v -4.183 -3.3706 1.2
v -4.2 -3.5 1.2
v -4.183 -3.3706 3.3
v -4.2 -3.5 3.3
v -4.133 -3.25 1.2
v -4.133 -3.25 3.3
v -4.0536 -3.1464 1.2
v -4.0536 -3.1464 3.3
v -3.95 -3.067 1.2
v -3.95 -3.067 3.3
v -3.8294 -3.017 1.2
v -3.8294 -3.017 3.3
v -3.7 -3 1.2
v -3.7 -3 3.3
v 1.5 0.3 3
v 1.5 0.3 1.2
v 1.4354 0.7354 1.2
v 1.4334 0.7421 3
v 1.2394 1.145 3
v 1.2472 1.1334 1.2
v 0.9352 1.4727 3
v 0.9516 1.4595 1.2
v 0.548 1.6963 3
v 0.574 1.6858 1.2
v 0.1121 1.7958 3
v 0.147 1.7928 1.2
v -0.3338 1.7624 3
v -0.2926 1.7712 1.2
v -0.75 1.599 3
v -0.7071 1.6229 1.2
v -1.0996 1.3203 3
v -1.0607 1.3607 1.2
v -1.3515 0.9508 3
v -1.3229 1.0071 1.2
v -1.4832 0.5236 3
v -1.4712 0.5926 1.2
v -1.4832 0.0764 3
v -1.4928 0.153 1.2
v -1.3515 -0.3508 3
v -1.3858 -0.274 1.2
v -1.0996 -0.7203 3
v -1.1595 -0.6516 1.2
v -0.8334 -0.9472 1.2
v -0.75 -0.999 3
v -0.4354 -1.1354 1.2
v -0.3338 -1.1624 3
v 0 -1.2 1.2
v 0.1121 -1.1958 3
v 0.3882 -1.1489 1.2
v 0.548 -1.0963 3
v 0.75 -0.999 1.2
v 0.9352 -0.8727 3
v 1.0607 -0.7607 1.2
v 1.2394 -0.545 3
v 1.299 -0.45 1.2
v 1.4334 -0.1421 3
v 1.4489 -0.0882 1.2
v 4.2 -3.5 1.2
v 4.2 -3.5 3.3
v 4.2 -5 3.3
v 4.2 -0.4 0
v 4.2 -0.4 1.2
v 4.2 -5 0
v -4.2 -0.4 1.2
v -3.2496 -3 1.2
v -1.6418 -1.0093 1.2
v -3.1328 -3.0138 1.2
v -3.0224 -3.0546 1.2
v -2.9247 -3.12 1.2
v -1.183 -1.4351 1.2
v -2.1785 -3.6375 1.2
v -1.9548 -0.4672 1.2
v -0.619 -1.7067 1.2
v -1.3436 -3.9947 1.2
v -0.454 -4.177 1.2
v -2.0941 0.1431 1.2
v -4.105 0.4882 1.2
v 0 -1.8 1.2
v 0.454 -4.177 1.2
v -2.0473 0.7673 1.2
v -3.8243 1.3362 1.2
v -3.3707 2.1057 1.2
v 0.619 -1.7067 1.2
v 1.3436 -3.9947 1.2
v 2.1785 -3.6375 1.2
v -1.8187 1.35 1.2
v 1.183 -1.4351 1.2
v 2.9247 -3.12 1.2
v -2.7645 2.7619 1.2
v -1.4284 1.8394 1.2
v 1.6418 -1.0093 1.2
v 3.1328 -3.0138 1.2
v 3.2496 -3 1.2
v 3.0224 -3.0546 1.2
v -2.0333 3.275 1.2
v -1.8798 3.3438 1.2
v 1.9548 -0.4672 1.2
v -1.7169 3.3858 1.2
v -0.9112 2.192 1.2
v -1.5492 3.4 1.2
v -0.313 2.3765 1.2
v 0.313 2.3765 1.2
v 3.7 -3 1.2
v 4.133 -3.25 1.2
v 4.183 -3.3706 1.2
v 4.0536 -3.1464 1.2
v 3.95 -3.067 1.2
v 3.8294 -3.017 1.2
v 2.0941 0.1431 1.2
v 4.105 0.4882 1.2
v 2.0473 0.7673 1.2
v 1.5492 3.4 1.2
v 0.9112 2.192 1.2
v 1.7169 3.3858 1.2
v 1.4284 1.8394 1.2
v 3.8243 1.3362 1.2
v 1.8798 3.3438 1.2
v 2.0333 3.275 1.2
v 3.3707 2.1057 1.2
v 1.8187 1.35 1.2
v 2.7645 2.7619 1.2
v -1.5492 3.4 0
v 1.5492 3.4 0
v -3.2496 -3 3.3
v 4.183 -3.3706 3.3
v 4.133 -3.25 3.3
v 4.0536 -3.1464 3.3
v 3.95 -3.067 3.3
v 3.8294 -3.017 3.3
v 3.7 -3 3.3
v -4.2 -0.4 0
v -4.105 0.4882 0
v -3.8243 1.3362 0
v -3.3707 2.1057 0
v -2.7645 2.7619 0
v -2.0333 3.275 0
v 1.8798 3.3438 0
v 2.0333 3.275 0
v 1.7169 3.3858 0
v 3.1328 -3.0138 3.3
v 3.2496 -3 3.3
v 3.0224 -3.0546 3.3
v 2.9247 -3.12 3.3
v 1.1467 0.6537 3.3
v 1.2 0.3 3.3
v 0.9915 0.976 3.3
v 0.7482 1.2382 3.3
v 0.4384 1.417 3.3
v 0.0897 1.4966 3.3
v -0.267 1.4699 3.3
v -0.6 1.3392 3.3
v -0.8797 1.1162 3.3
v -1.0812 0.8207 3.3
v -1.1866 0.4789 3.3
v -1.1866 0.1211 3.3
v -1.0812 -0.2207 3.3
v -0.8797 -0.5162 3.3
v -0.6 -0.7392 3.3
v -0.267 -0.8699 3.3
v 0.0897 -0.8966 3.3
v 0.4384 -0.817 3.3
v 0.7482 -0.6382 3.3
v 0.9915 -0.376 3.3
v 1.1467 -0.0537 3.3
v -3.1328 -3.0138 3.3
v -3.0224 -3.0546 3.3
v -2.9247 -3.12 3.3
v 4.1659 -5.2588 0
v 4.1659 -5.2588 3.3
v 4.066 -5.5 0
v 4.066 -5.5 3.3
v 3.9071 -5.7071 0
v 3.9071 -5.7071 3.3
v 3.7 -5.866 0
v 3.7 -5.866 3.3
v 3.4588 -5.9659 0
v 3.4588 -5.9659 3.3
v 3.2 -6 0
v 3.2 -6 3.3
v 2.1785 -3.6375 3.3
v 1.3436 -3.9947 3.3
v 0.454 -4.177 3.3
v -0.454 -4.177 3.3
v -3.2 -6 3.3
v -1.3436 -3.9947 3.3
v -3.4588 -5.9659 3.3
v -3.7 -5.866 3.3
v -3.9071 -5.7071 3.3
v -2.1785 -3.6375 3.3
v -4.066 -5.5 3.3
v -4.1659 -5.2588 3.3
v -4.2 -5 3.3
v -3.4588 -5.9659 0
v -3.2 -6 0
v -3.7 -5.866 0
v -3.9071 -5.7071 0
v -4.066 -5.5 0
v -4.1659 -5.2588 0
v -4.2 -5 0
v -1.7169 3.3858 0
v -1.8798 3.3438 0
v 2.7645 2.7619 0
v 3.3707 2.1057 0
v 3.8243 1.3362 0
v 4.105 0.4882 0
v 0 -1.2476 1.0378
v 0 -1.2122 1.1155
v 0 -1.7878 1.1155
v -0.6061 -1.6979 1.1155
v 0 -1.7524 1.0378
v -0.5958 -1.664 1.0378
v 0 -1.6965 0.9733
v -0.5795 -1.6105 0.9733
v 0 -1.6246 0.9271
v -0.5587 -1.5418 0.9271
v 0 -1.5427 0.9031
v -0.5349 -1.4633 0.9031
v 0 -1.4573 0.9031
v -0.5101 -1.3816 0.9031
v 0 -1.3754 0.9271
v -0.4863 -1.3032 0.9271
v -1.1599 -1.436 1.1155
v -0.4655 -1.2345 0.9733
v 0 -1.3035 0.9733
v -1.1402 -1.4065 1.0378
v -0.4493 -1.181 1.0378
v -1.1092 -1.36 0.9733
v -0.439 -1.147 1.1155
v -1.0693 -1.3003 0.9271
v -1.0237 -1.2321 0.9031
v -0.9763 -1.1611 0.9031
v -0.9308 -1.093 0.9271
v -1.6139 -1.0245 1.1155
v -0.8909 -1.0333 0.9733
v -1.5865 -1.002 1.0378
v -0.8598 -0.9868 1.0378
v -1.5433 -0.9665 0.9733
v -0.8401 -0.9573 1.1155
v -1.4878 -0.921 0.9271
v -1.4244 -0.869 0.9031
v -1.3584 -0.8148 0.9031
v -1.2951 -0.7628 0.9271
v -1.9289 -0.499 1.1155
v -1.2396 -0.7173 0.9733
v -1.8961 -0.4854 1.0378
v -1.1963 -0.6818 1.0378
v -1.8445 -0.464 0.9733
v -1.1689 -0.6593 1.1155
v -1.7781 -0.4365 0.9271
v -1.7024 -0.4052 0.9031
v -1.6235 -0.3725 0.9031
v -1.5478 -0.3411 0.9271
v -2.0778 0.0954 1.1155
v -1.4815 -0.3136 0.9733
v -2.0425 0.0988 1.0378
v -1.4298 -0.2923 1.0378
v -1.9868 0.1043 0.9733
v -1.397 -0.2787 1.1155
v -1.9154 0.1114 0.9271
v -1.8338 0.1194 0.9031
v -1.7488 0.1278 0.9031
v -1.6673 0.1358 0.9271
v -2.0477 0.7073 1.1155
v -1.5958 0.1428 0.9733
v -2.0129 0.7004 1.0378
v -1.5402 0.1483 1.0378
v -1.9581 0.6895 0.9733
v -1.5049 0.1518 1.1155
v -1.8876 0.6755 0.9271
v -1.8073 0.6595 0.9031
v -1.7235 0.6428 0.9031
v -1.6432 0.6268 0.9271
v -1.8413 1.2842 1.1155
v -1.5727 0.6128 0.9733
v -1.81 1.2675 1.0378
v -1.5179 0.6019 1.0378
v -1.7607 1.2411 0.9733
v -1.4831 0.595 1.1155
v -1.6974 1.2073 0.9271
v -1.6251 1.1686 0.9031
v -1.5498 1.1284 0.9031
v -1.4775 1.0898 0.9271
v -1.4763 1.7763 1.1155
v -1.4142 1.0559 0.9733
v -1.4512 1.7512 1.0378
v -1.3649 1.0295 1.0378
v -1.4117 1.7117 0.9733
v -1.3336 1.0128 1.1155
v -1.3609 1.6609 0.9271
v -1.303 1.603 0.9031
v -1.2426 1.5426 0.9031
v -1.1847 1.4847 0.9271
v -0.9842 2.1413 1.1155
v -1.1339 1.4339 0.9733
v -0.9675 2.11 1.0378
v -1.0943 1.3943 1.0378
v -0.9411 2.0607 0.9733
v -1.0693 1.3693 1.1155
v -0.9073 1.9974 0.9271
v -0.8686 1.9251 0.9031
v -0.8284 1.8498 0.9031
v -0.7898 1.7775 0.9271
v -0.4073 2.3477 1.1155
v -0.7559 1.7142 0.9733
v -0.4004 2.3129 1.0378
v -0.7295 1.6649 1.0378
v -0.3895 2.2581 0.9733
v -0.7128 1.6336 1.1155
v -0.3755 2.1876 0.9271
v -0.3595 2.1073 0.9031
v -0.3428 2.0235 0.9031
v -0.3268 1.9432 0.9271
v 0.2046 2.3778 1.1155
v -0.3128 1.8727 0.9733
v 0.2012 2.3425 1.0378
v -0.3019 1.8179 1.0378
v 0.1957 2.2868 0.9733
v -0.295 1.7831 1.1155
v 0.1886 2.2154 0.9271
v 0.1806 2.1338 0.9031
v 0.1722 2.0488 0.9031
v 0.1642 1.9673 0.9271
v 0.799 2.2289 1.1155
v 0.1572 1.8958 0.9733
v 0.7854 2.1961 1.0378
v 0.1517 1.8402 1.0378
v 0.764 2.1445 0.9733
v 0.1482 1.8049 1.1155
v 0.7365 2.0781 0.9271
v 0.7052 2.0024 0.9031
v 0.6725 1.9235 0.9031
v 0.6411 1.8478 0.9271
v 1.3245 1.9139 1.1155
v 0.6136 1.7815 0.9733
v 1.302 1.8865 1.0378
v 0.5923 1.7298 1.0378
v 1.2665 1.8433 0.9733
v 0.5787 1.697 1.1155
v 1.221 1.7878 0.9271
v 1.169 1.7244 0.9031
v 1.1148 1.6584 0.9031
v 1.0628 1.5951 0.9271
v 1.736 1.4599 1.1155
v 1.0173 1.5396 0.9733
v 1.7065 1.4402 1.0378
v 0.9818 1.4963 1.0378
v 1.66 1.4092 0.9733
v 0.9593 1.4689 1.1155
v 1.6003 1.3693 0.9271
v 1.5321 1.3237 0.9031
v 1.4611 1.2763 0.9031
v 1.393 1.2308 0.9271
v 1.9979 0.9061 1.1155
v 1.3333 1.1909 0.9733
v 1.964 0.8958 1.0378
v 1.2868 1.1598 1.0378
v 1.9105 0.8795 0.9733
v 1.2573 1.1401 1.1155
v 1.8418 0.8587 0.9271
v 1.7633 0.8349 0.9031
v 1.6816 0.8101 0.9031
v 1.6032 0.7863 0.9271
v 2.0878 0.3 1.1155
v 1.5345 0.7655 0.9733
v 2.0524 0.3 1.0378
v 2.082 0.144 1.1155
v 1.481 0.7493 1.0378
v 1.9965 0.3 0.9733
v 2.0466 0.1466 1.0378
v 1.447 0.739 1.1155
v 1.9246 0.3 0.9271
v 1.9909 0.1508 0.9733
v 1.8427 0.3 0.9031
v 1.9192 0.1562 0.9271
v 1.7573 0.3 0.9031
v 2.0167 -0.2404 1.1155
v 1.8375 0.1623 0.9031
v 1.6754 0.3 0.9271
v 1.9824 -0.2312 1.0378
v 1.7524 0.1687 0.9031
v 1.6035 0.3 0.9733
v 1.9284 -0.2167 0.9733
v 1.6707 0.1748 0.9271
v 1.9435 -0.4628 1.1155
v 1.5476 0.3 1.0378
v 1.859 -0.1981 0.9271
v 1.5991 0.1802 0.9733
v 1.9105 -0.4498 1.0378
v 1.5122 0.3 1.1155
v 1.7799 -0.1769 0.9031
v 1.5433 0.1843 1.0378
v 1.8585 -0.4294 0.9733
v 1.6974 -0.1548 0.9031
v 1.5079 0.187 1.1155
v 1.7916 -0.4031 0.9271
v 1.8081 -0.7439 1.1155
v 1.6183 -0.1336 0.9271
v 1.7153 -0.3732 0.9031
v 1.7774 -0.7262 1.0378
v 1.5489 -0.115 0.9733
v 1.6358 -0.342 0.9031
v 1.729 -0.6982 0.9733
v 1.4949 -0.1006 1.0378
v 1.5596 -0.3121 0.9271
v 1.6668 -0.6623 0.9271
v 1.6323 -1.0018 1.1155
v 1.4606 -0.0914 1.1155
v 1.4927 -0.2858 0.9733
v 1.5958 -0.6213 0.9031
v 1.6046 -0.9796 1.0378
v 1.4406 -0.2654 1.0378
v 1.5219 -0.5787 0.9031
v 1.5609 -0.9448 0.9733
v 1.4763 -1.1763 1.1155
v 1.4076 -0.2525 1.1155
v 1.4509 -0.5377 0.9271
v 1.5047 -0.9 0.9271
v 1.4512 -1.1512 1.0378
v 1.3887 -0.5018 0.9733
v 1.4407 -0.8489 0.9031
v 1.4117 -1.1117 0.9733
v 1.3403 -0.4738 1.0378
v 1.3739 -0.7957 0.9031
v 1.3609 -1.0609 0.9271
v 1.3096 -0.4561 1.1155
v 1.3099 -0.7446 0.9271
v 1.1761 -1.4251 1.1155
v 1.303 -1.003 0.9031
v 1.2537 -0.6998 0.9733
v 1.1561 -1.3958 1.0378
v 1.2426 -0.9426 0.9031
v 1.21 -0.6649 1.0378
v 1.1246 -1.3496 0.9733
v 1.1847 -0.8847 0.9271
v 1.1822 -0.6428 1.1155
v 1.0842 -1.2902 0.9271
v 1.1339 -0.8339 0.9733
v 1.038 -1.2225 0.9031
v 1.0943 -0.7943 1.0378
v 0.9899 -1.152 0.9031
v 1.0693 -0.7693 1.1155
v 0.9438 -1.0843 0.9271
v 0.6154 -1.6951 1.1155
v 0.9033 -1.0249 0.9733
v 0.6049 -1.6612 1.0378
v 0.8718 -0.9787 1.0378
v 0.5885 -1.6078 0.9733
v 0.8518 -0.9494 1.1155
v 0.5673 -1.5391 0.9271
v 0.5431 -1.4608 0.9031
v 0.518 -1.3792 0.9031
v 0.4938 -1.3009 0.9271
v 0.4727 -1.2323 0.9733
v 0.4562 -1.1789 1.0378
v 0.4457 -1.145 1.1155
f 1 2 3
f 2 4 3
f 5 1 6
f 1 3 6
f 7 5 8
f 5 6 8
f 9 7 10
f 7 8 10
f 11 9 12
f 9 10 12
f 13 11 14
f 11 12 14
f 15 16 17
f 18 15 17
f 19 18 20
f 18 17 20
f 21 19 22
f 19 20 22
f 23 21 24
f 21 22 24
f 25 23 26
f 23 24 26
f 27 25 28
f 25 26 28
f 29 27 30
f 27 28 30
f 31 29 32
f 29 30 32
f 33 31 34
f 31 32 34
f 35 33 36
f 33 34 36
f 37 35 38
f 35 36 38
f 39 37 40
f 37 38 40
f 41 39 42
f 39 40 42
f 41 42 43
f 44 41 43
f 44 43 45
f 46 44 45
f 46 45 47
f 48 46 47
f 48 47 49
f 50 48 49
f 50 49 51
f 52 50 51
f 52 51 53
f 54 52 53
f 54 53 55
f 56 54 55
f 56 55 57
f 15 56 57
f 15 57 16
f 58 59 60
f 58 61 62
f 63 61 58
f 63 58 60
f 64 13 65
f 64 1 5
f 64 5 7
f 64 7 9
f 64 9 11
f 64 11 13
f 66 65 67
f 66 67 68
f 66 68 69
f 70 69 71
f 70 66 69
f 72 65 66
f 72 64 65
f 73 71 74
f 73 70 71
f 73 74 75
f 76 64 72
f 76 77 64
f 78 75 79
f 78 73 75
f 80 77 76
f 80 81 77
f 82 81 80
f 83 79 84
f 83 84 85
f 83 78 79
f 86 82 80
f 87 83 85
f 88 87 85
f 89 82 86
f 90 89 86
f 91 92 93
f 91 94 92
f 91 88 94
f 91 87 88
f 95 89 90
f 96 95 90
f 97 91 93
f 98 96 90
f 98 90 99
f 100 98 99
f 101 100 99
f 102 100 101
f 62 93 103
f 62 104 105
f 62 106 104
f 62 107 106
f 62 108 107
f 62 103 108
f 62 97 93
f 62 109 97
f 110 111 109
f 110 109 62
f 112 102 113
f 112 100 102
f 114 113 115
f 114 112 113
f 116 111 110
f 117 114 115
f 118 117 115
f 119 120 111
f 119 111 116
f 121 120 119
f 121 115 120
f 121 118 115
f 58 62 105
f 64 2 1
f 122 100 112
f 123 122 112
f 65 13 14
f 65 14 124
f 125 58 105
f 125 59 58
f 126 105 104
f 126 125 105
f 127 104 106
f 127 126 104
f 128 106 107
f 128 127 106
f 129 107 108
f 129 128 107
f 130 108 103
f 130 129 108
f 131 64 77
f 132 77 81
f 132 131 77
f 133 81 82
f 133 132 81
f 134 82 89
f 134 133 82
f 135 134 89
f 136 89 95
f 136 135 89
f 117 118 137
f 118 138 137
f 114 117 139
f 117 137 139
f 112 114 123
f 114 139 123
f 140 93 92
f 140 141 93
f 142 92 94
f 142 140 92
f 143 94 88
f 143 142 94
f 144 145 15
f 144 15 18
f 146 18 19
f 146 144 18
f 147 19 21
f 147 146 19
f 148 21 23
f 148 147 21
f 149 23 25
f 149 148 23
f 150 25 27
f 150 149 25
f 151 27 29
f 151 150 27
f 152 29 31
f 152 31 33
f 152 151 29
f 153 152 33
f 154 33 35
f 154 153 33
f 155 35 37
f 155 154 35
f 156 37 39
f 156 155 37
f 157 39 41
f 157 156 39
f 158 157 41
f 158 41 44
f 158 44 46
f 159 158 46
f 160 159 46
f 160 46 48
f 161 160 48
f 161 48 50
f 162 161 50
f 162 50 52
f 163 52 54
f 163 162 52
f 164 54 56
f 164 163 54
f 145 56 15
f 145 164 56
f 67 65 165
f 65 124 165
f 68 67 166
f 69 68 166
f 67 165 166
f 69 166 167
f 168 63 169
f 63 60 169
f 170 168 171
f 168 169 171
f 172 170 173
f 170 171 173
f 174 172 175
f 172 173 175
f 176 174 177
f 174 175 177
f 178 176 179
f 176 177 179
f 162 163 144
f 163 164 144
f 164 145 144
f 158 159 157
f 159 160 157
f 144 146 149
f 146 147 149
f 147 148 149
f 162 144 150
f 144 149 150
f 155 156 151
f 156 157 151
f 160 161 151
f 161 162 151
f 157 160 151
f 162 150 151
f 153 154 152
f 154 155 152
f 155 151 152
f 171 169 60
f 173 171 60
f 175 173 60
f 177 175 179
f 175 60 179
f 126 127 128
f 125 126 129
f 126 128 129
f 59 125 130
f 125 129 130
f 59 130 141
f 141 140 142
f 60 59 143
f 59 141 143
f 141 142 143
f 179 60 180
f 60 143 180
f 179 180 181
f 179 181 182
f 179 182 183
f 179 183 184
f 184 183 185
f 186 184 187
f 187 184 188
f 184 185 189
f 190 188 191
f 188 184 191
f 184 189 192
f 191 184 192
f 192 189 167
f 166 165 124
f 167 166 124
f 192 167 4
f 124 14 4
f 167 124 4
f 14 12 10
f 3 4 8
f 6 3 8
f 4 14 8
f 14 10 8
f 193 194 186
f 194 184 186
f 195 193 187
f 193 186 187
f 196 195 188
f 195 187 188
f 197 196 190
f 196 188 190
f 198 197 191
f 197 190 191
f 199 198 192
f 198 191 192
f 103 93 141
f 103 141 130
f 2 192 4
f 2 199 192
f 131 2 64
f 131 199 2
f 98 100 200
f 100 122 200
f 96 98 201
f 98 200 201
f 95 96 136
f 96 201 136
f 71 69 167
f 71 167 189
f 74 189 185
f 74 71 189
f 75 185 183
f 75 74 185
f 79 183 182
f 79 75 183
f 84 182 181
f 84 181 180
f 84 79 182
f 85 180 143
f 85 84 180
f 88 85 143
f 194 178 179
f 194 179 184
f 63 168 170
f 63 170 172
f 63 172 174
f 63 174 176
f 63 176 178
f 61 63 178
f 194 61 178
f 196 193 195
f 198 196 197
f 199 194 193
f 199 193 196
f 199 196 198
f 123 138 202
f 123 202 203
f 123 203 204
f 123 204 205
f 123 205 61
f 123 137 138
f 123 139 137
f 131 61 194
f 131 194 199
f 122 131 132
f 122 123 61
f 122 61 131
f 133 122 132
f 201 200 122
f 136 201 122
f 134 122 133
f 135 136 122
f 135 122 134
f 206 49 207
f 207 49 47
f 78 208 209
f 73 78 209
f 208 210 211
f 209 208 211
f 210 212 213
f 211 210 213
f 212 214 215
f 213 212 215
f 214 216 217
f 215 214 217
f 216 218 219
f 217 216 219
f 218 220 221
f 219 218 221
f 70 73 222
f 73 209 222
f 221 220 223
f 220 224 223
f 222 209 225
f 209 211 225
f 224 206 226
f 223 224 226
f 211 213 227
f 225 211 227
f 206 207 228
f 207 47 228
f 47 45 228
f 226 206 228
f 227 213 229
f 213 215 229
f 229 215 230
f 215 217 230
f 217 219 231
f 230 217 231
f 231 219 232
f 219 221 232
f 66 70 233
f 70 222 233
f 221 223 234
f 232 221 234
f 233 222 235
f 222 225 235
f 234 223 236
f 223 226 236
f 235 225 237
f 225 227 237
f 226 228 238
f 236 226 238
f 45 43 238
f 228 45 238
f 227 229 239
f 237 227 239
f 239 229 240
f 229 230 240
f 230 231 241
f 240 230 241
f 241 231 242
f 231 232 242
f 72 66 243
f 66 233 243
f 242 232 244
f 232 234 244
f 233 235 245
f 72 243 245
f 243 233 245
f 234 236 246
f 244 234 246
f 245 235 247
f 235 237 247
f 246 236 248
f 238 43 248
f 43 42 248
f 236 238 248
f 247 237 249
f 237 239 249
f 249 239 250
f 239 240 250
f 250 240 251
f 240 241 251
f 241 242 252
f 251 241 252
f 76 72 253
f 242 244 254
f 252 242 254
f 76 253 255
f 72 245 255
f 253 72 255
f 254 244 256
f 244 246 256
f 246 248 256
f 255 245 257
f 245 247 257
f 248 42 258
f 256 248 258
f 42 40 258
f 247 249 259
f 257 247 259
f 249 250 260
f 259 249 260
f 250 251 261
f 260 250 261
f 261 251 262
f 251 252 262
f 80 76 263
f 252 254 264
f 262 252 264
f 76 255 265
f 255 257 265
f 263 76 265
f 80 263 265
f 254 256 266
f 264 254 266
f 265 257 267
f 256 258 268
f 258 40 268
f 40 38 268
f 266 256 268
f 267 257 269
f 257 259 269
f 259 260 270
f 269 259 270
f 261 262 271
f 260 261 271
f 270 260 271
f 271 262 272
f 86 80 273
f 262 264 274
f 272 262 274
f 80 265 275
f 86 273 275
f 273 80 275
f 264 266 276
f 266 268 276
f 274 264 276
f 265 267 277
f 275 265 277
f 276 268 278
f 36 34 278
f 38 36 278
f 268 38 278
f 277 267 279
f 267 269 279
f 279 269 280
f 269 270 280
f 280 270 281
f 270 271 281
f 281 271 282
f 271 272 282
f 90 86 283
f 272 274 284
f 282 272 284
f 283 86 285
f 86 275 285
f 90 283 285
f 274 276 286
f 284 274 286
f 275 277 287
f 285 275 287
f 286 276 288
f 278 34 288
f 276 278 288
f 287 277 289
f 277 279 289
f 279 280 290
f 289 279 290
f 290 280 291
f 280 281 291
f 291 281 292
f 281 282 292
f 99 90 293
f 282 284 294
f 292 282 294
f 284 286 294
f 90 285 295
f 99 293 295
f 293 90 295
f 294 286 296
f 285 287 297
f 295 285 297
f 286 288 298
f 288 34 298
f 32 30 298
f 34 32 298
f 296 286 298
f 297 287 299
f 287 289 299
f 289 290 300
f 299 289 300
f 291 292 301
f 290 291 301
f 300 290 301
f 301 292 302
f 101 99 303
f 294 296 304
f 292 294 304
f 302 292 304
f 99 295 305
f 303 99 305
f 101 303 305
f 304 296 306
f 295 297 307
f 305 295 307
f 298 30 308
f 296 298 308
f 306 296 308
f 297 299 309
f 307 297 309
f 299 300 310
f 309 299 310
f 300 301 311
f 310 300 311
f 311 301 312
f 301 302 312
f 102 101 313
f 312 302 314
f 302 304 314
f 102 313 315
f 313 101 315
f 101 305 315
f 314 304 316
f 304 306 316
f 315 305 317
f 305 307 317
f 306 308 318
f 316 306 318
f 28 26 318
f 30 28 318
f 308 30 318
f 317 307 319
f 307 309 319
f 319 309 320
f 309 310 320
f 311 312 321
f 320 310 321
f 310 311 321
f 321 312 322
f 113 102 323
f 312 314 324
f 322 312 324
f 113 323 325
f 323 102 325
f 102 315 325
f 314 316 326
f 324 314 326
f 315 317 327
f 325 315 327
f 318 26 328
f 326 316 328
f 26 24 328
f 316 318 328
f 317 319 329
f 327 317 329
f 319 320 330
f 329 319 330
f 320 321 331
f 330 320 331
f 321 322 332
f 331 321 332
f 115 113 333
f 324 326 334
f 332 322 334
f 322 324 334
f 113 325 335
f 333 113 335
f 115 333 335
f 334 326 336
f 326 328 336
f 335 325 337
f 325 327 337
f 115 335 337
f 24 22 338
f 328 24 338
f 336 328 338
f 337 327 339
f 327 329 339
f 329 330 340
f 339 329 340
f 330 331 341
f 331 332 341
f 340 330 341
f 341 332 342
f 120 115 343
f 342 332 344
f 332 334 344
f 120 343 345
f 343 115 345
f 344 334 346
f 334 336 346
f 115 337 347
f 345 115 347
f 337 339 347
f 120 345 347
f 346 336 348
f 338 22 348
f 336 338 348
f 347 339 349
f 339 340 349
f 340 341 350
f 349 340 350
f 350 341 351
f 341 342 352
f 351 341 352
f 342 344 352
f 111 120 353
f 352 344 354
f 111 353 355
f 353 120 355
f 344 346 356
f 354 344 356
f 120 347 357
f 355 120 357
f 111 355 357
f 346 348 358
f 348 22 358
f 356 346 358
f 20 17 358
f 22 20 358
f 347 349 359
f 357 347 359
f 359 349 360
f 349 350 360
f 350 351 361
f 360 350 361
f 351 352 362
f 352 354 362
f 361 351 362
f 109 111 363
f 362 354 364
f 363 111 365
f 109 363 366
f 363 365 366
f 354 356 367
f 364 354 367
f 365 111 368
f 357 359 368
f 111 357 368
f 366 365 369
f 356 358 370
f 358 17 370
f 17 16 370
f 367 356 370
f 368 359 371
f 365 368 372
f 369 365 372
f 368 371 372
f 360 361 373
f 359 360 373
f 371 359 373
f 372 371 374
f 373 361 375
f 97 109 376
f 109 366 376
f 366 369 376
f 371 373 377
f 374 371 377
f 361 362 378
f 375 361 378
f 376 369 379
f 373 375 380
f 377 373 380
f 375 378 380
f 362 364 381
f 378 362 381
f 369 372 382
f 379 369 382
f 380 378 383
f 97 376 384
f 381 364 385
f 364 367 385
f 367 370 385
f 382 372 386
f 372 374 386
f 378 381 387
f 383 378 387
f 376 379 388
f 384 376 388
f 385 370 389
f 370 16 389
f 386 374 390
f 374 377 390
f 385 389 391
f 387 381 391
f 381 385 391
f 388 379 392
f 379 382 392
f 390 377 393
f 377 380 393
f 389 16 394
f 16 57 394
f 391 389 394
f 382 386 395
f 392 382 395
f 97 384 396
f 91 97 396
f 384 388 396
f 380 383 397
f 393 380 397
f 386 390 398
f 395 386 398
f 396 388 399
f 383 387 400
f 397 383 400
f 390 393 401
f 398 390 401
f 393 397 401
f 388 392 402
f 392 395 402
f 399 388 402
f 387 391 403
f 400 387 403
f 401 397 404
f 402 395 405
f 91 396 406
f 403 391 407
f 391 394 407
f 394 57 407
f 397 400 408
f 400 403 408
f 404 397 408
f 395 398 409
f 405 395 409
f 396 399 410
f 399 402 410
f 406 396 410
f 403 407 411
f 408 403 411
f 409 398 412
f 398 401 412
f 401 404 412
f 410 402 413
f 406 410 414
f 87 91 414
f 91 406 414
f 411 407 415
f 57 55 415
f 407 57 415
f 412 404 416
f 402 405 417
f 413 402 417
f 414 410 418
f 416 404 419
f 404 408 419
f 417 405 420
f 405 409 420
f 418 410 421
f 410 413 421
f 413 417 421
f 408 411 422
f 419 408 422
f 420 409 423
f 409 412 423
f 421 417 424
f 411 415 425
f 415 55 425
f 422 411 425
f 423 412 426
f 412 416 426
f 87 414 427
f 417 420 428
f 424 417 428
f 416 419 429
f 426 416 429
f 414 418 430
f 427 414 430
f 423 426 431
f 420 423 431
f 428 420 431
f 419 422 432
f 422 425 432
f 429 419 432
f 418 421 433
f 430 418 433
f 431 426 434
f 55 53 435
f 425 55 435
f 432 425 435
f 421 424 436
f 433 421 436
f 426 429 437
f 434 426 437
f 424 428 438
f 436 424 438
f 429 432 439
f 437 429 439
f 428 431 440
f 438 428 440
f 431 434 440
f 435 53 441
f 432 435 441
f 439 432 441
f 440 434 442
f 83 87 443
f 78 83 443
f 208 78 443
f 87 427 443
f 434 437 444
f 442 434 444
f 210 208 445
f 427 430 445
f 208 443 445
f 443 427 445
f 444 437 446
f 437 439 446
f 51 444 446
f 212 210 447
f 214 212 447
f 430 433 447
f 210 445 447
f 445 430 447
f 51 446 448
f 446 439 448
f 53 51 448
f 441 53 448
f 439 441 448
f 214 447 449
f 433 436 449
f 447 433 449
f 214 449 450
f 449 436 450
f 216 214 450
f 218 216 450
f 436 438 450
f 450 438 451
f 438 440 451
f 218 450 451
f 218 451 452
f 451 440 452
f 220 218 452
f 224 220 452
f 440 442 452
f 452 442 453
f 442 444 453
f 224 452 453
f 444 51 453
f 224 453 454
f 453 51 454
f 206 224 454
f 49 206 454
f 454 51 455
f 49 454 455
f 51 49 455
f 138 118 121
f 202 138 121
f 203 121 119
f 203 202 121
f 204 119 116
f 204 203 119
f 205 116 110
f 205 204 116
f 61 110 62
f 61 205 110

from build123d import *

# Parameters (mm, degrees)
BASIC_DEPTH             = 3.3
BEARING_START           = -2.1
SKETCH2_R               = 1.5
BEARING_CLEARANCE_DEPTH = 2.1
TOP_CLEARANCE_DEPTH     = 8.61905506
FILLET_R1_R             = 1
FILLET_R0_5_R           = 0.5
CHAMFER_R0_3_45_SIZE    = 0.3


with BuildPart() as part:
    # Sketch1 → Basic (new body)
    with BuildSketch(Plane.XY):
        with BuildLine():
            Line((4.2, -0.4), (4.2, -6))
            Line((4.2, -6), (-4.2, -6))
            Line((-4.2, -6), (-4.2, -0.4))
            ThreePointArc((-4.2, -0.4), (0, 3.8), (4.2, -0.4))
        make_face()
    extrude(amount=BASIC_DEPTH)

    # Sketch2 → Bearing Clearance (cut)
    with BuildSketch(Plane.XY.offset(3.3).offset(BEARING_START)):
        with BuildLine():
            Line((-4.2, -3), (-3.059411708, -3))
            ThreePointArc((-3.059411708, -3), (0, -4.2), (3.059411708, -3))
            Line((3.059411708, -3), (4.2, -3))
            Line((4.2, -3), (4.2, -0.4))
            ThreePointArc((4.2, -0.4), (0, 3.8), (-4.2, -0.4))
            Line((-4.2, -0.4), (-4.2, -3))
        make_face()
        with Locations((0, 0.3)):
            Circle(SKETCH2_R, mode=Mode.SUBTRACT)
    extrude(amount=BEARING_CLEARANCE_DEPTH, mode=Mode.SUBTRACT)

    # Sketch3 → Top Clearance (cut, through all)
    with BuildSketch(Plane.XY.offset(1.2)):
        with BuildLine():
            Line((-1.788854382, 3.4), (1.788854382, 3.4))
            ThreePointArc((1.788854382, 3.4), (0, 3.8), (-1.788854382, 3.4))
        make_face()
    extrude(amount=-TOP_CLEARANCE_DEPTH, mode=Mode.SUBTRACT)

    # Sketch7 → Bearing Get Low (revolve, cut)
    with BuildSketch(Plane(origin=(0, 0, 0), x_dir=(0, 0, -1), z_dir=(1, 0, 0)), mode=Mode.PRIVATE) as bearing_get_low_sk:
        with BuildLine():
            Line((-1.2, 1.8), (-1.2, 2.4))
            ThreePointArc((-1.2, 2.4), (-0.9, 2.1), (-1.2, 1.8))
        make_face()
    revolve(bearing_get_low_sk.sketch.rotate(Axis((0, 0.3, 3.3), (0, 0, -1)), 180), axis=Axis((0, 0.3, 3.3), (0, 0, -1)), mode=Mode.SUBTRACT)

    # R1
    fillet_r1_edges = [part.edges().sort_by_distance(p)[0] for p in [
        (-1.788854382, 3.4, 0.6),
        (1.788854382, 3.4, 0.6),
        (-4.2, -6, 1.65),
        (4.2, -6, 1.65),
    ]]
    fillet(fillet_r1_edges, radius=FILLET_R1_R)

    # R0.5
    fillet_r0_5_edges = [part.edges().sort_by_distance(p)[0] for p in [
        (-4.2, -3, 2.25),
        (-3.059411708, -3, 2.25),
        (3.059411708, -3, 2.25),
        (4.2, -3, 2.25),
    ]]
    fillet(fillet_r0_5_edges, radius=FILLET_R0_5_R)

    # R0.3×45°
    chamfer_r0_3_45_edges = [part.edges().sort_by_distance(p)[0] for p in [
        (-1.5, 0.3, 3.3),
    ]]
    chamfer(chamfer_r0_3_45_edges, length=CHAMFER_R0_3_45_SIZE)


solid = part.part
